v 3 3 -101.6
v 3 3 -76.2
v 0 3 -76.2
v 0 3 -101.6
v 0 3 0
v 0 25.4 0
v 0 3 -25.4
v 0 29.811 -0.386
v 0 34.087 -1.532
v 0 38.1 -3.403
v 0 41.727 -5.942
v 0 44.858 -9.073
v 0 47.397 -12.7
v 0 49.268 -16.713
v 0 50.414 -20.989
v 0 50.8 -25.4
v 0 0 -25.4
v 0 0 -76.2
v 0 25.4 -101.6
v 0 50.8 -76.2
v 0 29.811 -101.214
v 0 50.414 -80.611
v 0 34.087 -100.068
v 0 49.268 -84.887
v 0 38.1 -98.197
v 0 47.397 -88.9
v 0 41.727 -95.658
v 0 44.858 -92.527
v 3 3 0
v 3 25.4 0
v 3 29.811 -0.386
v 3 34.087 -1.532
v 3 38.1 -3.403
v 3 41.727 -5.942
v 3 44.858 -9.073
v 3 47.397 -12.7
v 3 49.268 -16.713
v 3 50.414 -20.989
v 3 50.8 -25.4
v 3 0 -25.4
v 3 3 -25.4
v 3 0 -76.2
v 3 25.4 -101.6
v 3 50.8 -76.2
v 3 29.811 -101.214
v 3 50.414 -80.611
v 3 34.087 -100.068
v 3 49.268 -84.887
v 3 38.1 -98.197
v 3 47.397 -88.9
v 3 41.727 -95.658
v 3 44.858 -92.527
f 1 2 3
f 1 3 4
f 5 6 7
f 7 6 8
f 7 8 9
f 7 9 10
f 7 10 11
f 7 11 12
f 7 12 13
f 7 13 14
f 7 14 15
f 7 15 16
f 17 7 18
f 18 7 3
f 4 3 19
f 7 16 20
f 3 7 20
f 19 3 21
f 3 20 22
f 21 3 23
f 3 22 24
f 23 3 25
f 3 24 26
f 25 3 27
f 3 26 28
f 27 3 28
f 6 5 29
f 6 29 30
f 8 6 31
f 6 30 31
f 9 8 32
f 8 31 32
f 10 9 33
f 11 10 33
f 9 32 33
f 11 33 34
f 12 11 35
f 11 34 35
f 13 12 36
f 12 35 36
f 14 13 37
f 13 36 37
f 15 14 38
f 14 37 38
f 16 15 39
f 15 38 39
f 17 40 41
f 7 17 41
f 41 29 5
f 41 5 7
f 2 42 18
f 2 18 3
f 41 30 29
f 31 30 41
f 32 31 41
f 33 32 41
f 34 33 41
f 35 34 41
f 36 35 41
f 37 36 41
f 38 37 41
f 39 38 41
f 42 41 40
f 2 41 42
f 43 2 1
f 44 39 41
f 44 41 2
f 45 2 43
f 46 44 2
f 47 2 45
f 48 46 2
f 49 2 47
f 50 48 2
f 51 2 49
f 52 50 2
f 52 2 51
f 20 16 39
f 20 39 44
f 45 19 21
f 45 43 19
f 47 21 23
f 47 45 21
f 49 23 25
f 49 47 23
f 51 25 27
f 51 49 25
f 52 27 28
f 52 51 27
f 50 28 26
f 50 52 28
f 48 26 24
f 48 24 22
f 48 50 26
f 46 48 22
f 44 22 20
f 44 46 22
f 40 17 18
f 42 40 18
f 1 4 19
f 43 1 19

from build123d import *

# Parameters (mm, degrees)
SKETCH2_W           = 101.6
SKETCH2_H           = 50.8
BOSS_EXTRUDE1_DEPTH = 3
FILLET1_R           = 25.4
SKETCH4_W           = 25.4
SKETCH4_H           = 3
CUT_EXTRUDE1_DEPTH  = 3


with BuildPart() as part:
    # Sketch2 → Boss-Extrude1 (new body)
    with BuildSketch(Plane(origin=(0, 0, 0), x_dir=(0, 0, -1), z_dir=(1, 0, 0))):
        with Locations((50.8, 25.4)):
            Rectangle(SKETCH2_W, SKETCH2_H)
    extrude(amount=BOSS_EXTRUDE1_DEPTH)

    # Fillet1
    fillet1_edges = [part.edges().sort_by_distance(p)[0] for p in [
        (1.5, 50.8, 0),
        (1.5, 50.8, -101.6),
    ]]
    fillet(fillet1_edges, radius=FILLET1_R)

    # Sketch4 → Cut-Extrude1 (cut)
    with BuildSketch(Plane(origin=(3, 0, 0), x_dir=(0, 0, -1), z_dir=(1, 0, 0))):
        with Locations((12.7, 1.5)):
            Rectangle(SKETCH4_W, SKETCH4_H)
        with Locations((88.9, 1.5)):
            Rectangle(SKETCH4_W, SKETCH4_H)
    extrude(amount=-CUT_EXTRUDE1_DEPTH, mode=Mode.SUBTRACT)


solid = part.part
